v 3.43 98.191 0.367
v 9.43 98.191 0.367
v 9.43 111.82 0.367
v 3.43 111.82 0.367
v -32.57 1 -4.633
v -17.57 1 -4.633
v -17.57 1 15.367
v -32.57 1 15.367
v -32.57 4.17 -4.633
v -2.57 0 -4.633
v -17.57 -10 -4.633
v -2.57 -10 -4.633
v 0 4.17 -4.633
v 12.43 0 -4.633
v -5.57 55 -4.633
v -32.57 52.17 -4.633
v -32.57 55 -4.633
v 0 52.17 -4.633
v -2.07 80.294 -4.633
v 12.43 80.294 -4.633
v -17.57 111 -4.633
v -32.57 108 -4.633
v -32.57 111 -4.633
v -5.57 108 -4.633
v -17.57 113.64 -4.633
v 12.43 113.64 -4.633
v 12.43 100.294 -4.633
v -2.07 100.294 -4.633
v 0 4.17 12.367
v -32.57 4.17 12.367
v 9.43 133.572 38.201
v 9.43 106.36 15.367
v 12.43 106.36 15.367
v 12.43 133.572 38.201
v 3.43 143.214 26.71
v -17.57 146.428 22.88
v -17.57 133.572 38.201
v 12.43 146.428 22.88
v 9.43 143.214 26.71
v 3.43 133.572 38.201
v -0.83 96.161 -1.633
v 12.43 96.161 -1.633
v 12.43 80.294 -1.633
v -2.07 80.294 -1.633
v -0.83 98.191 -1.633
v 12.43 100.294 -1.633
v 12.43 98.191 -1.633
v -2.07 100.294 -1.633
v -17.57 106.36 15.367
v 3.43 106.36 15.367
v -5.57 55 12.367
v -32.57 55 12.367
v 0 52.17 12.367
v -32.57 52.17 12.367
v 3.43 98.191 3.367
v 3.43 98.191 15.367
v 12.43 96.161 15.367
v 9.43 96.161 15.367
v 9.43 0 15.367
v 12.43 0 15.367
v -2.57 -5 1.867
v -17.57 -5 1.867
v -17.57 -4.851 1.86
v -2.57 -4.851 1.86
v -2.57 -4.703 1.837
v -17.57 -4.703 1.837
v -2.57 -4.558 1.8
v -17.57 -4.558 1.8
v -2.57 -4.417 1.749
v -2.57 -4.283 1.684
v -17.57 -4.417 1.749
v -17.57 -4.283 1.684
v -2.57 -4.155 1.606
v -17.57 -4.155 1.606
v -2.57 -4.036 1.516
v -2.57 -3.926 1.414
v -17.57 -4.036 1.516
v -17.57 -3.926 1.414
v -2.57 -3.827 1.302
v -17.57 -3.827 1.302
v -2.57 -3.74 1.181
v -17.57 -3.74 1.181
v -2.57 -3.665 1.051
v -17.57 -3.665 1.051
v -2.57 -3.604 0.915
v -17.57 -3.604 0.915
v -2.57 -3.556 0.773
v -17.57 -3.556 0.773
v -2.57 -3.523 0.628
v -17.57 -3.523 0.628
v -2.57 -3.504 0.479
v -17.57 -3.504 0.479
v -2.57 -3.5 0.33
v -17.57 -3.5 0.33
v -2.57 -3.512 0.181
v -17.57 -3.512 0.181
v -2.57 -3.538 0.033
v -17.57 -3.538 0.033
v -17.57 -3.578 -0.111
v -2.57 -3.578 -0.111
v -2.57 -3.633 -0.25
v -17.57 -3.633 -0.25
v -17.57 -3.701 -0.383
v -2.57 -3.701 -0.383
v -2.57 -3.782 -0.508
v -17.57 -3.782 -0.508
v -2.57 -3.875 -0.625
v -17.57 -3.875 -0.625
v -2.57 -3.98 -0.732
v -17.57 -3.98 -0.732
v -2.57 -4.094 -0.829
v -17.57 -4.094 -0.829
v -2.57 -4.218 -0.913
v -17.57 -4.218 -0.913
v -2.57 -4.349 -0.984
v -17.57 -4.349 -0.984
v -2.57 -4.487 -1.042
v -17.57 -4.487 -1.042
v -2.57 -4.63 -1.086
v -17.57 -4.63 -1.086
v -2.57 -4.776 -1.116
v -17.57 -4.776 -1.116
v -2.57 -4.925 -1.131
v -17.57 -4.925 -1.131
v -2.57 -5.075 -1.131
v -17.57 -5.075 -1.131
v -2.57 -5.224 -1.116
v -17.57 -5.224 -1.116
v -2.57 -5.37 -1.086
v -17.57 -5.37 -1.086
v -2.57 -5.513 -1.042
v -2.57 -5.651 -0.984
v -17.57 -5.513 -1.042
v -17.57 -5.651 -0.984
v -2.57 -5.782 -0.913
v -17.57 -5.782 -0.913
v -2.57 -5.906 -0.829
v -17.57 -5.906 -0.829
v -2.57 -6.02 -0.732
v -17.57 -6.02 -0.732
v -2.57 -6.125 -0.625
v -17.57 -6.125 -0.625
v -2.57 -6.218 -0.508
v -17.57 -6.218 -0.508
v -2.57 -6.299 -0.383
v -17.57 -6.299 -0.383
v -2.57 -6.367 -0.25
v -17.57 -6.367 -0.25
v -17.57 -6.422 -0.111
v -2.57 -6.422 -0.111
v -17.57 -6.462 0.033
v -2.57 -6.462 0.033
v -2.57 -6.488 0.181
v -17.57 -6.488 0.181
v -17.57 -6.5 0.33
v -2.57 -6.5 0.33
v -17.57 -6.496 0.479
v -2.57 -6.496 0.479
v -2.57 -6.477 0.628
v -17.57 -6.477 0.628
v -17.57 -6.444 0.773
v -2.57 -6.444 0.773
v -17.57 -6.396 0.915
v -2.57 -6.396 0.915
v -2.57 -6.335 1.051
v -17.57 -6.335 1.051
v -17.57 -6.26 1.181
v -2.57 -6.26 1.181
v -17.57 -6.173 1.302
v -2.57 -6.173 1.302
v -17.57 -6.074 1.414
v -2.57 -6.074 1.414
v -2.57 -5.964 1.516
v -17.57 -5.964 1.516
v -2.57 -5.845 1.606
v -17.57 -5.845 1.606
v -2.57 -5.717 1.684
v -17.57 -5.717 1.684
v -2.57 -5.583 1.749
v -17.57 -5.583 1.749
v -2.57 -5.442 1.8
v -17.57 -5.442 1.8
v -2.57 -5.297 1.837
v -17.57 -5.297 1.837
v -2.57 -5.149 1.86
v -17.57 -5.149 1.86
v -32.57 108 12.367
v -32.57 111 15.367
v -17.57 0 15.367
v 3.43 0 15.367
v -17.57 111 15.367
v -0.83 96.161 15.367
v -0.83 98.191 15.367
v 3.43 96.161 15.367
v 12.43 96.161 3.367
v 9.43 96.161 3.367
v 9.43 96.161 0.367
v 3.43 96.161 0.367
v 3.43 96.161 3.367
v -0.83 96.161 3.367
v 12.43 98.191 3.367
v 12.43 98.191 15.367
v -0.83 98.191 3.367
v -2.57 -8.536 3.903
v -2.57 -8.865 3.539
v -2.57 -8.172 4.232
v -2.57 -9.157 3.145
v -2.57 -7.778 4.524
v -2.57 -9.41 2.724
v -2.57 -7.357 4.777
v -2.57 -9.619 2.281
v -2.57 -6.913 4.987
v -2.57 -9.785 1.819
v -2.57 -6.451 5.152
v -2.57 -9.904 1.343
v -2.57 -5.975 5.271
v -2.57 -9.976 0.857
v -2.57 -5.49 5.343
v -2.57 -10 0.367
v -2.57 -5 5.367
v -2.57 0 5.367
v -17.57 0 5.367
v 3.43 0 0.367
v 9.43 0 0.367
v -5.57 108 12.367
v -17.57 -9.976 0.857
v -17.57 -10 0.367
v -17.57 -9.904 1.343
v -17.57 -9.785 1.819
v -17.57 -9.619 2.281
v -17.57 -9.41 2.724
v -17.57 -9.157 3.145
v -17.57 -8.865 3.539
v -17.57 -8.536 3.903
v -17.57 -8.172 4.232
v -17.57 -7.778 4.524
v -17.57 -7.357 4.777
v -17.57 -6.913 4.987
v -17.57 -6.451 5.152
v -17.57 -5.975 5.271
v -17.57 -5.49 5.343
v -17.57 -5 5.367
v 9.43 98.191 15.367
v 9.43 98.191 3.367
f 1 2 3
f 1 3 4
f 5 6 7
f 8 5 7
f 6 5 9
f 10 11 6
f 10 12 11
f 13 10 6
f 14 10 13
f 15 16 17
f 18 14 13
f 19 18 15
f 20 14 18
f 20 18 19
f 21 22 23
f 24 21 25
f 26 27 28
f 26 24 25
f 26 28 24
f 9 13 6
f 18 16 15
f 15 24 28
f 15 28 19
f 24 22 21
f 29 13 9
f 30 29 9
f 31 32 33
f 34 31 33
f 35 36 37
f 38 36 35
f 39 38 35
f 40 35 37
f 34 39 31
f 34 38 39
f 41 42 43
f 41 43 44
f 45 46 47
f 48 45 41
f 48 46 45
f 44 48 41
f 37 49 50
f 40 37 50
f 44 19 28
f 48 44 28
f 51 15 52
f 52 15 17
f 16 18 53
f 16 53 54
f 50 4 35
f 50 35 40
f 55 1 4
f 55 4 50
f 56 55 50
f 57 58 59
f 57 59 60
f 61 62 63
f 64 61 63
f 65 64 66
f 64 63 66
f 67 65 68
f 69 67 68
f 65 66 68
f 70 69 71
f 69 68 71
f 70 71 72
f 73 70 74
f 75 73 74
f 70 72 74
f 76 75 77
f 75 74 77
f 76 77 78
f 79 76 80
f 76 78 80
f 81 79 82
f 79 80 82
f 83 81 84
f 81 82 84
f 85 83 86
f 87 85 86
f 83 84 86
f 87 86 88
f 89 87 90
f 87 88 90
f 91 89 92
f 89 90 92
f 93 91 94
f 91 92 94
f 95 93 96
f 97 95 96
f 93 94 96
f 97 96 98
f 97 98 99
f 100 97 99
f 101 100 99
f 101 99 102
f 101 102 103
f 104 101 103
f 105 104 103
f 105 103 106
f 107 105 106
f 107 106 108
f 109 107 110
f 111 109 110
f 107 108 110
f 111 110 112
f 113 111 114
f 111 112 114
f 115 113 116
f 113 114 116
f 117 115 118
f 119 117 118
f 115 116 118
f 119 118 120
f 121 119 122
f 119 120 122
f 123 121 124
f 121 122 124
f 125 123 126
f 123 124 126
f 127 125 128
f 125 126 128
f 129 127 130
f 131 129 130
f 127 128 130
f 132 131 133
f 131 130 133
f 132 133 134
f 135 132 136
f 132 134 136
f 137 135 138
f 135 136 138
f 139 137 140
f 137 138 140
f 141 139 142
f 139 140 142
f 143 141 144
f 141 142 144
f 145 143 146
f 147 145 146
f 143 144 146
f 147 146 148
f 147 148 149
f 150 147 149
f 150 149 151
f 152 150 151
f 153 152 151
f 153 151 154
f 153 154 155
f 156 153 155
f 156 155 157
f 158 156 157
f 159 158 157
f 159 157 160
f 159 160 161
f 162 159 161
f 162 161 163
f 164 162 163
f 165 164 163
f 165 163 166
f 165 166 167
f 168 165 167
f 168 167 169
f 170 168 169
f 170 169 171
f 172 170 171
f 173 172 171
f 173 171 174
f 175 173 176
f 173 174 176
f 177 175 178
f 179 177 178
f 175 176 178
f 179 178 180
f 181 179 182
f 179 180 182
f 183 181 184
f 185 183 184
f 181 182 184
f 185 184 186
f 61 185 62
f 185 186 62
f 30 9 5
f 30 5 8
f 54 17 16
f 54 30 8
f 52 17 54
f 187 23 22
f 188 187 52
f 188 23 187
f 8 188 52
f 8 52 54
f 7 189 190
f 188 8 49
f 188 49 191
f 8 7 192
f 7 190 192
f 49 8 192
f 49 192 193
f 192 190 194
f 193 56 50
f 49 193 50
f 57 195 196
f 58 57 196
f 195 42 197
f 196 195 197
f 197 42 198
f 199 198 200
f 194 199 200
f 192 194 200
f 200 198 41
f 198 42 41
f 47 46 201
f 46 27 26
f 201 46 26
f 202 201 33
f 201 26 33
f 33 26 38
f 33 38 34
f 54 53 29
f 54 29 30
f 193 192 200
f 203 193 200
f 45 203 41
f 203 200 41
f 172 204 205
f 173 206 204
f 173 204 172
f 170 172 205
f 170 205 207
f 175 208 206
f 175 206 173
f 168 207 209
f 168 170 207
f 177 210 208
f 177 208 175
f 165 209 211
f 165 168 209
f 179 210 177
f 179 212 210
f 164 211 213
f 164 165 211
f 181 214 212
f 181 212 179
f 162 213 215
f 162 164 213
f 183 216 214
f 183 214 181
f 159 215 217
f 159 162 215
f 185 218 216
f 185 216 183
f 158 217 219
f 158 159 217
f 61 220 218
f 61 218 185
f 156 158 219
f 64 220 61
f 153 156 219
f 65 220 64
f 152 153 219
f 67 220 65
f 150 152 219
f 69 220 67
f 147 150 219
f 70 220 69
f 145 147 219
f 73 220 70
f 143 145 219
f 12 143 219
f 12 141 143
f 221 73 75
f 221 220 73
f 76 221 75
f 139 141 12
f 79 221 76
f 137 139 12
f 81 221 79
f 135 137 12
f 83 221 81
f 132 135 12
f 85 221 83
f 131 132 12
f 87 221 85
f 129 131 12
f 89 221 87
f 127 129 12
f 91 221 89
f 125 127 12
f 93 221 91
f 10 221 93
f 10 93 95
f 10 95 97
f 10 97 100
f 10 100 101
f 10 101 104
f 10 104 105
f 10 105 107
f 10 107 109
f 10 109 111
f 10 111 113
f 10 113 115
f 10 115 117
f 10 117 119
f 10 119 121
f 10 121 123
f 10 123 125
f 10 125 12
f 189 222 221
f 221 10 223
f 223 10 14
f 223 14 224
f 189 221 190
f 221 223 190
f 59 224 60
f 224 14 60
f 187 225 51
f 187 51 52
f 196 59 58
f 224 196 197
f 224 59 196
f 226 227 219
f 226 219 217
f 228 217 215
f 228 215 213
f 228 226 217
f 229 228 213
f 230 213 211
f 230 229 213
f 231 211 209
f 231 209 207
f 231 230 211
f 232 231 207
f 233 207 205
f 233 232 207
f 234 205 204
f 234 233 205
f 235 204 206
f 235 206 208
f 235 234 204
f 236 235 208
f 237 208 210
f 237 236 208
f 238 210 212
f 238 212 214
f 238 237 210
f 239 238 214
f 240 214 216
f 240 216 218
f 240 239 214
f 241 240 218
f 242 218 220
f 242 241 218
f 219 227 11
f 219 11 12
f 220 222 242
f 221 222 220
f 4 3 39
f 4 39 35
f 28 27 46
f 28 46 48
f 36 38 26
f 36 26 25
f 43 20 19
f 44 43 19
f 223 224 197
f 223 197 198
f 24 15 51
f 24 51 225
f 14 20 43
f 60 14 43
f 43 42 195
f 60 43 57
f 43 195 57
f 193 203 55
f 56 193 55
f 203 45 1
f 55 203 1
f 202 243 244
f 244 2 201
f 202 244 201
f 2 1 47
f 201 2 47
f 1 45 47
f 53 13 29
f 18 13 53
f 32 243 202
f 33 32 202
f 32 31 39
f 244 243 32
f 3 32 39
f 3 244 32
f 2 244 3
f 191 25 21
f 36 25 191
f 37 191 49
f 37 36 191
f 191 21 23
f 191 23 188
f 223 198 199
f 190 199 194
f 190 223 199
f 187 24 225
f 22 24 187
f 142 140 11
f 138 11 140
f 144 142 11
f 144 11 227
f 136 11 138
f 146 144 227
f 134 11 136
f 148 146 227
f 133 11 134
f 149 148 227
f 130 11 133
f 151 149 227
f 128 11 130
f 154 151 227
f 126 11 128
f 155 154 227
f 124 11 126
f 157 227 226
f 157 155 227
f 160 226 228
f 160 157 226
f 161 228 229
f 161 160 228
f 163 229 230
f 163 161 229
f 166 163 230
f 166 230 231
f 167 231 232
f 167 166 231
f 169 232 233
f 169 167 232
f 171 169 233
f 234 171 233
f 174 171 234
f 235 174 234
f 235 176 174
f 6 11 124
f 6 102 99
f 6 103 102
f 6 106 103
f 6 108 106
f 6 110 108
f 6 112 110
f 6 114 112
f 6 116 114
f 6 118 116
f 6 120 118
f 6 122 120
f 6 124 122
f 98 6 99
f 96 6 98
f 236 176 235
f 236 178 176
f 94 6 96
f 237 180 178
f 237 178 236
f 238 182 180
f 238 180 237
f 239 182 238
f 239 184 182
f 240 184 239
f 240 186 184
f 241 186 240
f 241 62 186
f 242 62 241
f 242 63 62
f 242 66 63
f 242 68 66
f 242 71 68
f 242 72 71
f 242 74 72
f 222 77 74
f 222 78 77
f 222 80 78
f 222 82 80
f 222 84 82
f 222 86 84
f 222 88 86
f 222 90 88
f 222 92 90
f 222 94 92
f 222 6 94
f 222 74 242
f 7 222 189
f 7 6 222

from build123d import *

# Parameters (mm, degrees)
SKETCH_1_W                = 30
SKETCH_1_H                = 20
SKETCH_3_W                = 30
SKETCH_3_H                = 10
EXTRUDE_2_DEPTH           = 10
SKETCH_4_W                = 10
SKETCH_4_H                = 10
CUT_EXTRUDE_1_DEPTH       = 15
CUT_EXTRUDE_2_DEPTH       = 15
SKETCH_6_R                = 1.5
CUT_EXTRUDE_3_DEPTH       = 15
SKETCH_8_W                = 6
SKETCH_8_H                = 15
SKETCH_12_W               = 20
SKETCH_12_H               = 110
EXTRUDE_3_DEPTH           = 15
SKETCH_14_W               = 27
SKETCH_14_H               = 53
SKETCH_14_W_2             = 32.56993007
SKETCH_14_H_2             = 48
CUT_EXTRUDE_6_DEPTH       = 17
SKETCH_18_W               = 14.5
SKETCH_18_H               = 20
CUT_EXTRUDE_7_DEPTH       = 3
SKETCH_19_W               = 13.260290085
SKETCH_19_H               = 2.030039981
CUT_EXTRUDE_8_DEPTH       = 5
CUT_EXTRUDE_START         = 96.160609199
CUT_EXTRUDE_9_OUTLINE_W   = 4.260290085
CUT_EXTRUDE_9_OUTLINE_H   = 12
CUT_EXTRUDE_9_OUTLINE_W_2 = 3
CUT_EXTRUDE_9_DEPTH       = 2.030039981


# Read off the part's stored shape, not the designer's step: 切除-拉伸9
with BuildPart() as part:
    # Sweep 1: sweep along a path in 草图2
    with BuildLine(Plane(origin=(-2.57, 0, 0), x_dir=(0, 0, -1), z_dir=(1, 0, 0))) as sweep_1_path:
        Line((-5.367132867, 0), (-5.367132867, 110))
        Line((-5.367132867, 110), (-30.540121802, 140))
    # 草图1 → Sweep 1 (sweep)
    with BuildSketch(Plane(origin=(0, 0, 0), x_dir=(1, 0, 0), z_dir=(0, 1, 0))):
        with Locations((-2.56993007, -5.367132867)):
            Rectangle(SKETCH_1_W, SKETCH_1_H)
    sweep(path=sweep_1_path.line, transition=Transition.RIGHT)

    # 草图3 → 凸台-拉伸2 (add)
    with BuildSketch(Plane.XZ):
        with Locations((-2.56993007, 0.367132867)):
            Rectangle(SKETCH_3_W, SKETCH_3_H)
    extrude(amount=EXTRUDE_2_DEPTH)

    # 草图4 → 切除-拉伸1 (cut)
    with BuildSketch(Plane(origin=(12.43006993, 0, 0), x_dir=(0, 0, -1), z_dir=(1, 0, 0))):
        with Locations((-0.367132867, -5)):
            Rectangle(SKETCH_4_W, SKETCH_4_H)
    extrude(amount=-CUT_EXTRUDE_1_DEPTH, mode=Mode.SUBTRACT)

    # 草图5 → 切除-拉伸2 (cut)
    with BuildSketch(Plane.ZY.offset(17.56993007)):
        with BuildLine():
            Line((5.367132867, -10), (0.367132867, -10))
            ThreePointArc((0.367132867, -10), (3.902666773, -8.535533906), (5.367132867, -5))
            Line((5.367132867, -5), (5.367132867, -10))
        make_face()
    extrude(amount=-CUT_EXTRUDE_2_DEPTH, mode=Mode.SUBTRACT)

    # 草图6 → 切除-拉伸3 (cut)
    with BuildSketch(Plane.ZY.offset(17.56993007)):
        with Locations((0.367132867, -5)):
            Circle(SKETCH_6_R)
    extrude(amount=-CUT_EXTRUDE_3_DEPTH, mode=Mode.SUBTRACT)

    # Sweep 1 2: sweep along a path in 草图10
    with BuildLine(Plane(origin=(6.43006993, 0, 0), x_dir=(0, 0, -1), z_dir=(1, 0, 0))) as sweep_1_2_path:
        Line((-32.45523291, 138.393030976), (-7.867132867, 109.090074414))
        Line((-7.867132867, 109.090074414), (-7.867132867, 0))
    # 草图8 → Sweep 1 2 (sweep, cut)
    with BuildSketch(Plane(origin=(0, 97.193446801, 81.554985364), x_dir=(1, 0, 0), z_dir=(0, 0.7660444431189773, 0.6427876096865403))):
        with Locations((6.43006993, 64.095174757)):
            Rectangle(SKETCH_8_W, SKETCH_8_H)
    sweep(path=sweep_1_2_path.line, transition=Transition.RIGHT, mode=Mode.SUBTRACT)

    # 草图12 → 凸台-拉伸3 (add)
    with BuildSketch(Plane.ZY.offset(17.56993007)):
        with Locations((5.367132867, 56)):
            Rectangle(SKETCH_12_W, SKETCH_12_H)
    extrude(amount=EXTRUDE_3_DEPTH)

    # 草图14 → 切除-拉伸6 (cut)
    with BuildSketch(Plane(origin=(0, 0, -4.632867133), x_dir=(-1, 0, 0), z_dir=(0, 0, -1))):
        with Locations((19.06993007, 81.5)):
            Rectangle(SKETCH_14_W, SKETCH_14_H)
        with Locations((16.284965035, 28.17035924)):
            Rectangle(SKETCH_14_W_2, SKETCH_14_H_2)
    extrude(amount=-CUT_EXTRUDE_6_DEPTH, mode=Mode.SUBTRACT)

    # 草图18 → 切除-拉伸7 (cut)
    with BuildSketch(Plane(origin=(0, 0, -4.632867133), x_dir=(-1, 0, 0), z_dir=(0, 0, -1))):
        with Locations((-5.18006993, 90.294394936)):
            Rectangle(SKETCH_18_W, SKETCH_18_H)
    extrude(amount=-CUT_EXTRUDE_7_DEPTH, mode=Mode.SUBTRACT)

    # 草图19 → 切除-拉伸8 (cut)
    with BuildSketch(Plane(origin=(0, 0, -1.632867133), x_dir=(-1, 0, 0), z_dir=(0, 0, -1))):
        with Locations((-5.799924888, 97.17562919)):
            Rectangle(SKETCH_19_W, SKETCH_19_H)
    extrude(amount=-CUT_EXTRUDE_8_DEPTH, mode=Mode.SUBTRACT)

    # 切除-拉伸9 outline → 切除-拉伸9 (cut)
    with BuildSketch(Plane(origin=(0, 0, 0), x_dir=(1, 0, 0), z_dir=(0, 1, 0)).offset(CUT_EXTRUDE_START)):
        with Locations((1.299924888, -9.367132867)):
            Rectangle(CUT_EXTRUDE_9_OUTLINE_W, CUT_EXTRUDE_9_OUTLINE_H)
        with Locations((10.93006993, -9.367132867)):
            Rectangle(CUT_EXTRUDE_9_OUTLINE_W_2, CUT_EXTRUDE_9_OUTLINE_H)
    extrude(amount=CUT_EXTRUDE_9_DEPTH, mode=Mode.SUBTRACT)


solid = part.part
